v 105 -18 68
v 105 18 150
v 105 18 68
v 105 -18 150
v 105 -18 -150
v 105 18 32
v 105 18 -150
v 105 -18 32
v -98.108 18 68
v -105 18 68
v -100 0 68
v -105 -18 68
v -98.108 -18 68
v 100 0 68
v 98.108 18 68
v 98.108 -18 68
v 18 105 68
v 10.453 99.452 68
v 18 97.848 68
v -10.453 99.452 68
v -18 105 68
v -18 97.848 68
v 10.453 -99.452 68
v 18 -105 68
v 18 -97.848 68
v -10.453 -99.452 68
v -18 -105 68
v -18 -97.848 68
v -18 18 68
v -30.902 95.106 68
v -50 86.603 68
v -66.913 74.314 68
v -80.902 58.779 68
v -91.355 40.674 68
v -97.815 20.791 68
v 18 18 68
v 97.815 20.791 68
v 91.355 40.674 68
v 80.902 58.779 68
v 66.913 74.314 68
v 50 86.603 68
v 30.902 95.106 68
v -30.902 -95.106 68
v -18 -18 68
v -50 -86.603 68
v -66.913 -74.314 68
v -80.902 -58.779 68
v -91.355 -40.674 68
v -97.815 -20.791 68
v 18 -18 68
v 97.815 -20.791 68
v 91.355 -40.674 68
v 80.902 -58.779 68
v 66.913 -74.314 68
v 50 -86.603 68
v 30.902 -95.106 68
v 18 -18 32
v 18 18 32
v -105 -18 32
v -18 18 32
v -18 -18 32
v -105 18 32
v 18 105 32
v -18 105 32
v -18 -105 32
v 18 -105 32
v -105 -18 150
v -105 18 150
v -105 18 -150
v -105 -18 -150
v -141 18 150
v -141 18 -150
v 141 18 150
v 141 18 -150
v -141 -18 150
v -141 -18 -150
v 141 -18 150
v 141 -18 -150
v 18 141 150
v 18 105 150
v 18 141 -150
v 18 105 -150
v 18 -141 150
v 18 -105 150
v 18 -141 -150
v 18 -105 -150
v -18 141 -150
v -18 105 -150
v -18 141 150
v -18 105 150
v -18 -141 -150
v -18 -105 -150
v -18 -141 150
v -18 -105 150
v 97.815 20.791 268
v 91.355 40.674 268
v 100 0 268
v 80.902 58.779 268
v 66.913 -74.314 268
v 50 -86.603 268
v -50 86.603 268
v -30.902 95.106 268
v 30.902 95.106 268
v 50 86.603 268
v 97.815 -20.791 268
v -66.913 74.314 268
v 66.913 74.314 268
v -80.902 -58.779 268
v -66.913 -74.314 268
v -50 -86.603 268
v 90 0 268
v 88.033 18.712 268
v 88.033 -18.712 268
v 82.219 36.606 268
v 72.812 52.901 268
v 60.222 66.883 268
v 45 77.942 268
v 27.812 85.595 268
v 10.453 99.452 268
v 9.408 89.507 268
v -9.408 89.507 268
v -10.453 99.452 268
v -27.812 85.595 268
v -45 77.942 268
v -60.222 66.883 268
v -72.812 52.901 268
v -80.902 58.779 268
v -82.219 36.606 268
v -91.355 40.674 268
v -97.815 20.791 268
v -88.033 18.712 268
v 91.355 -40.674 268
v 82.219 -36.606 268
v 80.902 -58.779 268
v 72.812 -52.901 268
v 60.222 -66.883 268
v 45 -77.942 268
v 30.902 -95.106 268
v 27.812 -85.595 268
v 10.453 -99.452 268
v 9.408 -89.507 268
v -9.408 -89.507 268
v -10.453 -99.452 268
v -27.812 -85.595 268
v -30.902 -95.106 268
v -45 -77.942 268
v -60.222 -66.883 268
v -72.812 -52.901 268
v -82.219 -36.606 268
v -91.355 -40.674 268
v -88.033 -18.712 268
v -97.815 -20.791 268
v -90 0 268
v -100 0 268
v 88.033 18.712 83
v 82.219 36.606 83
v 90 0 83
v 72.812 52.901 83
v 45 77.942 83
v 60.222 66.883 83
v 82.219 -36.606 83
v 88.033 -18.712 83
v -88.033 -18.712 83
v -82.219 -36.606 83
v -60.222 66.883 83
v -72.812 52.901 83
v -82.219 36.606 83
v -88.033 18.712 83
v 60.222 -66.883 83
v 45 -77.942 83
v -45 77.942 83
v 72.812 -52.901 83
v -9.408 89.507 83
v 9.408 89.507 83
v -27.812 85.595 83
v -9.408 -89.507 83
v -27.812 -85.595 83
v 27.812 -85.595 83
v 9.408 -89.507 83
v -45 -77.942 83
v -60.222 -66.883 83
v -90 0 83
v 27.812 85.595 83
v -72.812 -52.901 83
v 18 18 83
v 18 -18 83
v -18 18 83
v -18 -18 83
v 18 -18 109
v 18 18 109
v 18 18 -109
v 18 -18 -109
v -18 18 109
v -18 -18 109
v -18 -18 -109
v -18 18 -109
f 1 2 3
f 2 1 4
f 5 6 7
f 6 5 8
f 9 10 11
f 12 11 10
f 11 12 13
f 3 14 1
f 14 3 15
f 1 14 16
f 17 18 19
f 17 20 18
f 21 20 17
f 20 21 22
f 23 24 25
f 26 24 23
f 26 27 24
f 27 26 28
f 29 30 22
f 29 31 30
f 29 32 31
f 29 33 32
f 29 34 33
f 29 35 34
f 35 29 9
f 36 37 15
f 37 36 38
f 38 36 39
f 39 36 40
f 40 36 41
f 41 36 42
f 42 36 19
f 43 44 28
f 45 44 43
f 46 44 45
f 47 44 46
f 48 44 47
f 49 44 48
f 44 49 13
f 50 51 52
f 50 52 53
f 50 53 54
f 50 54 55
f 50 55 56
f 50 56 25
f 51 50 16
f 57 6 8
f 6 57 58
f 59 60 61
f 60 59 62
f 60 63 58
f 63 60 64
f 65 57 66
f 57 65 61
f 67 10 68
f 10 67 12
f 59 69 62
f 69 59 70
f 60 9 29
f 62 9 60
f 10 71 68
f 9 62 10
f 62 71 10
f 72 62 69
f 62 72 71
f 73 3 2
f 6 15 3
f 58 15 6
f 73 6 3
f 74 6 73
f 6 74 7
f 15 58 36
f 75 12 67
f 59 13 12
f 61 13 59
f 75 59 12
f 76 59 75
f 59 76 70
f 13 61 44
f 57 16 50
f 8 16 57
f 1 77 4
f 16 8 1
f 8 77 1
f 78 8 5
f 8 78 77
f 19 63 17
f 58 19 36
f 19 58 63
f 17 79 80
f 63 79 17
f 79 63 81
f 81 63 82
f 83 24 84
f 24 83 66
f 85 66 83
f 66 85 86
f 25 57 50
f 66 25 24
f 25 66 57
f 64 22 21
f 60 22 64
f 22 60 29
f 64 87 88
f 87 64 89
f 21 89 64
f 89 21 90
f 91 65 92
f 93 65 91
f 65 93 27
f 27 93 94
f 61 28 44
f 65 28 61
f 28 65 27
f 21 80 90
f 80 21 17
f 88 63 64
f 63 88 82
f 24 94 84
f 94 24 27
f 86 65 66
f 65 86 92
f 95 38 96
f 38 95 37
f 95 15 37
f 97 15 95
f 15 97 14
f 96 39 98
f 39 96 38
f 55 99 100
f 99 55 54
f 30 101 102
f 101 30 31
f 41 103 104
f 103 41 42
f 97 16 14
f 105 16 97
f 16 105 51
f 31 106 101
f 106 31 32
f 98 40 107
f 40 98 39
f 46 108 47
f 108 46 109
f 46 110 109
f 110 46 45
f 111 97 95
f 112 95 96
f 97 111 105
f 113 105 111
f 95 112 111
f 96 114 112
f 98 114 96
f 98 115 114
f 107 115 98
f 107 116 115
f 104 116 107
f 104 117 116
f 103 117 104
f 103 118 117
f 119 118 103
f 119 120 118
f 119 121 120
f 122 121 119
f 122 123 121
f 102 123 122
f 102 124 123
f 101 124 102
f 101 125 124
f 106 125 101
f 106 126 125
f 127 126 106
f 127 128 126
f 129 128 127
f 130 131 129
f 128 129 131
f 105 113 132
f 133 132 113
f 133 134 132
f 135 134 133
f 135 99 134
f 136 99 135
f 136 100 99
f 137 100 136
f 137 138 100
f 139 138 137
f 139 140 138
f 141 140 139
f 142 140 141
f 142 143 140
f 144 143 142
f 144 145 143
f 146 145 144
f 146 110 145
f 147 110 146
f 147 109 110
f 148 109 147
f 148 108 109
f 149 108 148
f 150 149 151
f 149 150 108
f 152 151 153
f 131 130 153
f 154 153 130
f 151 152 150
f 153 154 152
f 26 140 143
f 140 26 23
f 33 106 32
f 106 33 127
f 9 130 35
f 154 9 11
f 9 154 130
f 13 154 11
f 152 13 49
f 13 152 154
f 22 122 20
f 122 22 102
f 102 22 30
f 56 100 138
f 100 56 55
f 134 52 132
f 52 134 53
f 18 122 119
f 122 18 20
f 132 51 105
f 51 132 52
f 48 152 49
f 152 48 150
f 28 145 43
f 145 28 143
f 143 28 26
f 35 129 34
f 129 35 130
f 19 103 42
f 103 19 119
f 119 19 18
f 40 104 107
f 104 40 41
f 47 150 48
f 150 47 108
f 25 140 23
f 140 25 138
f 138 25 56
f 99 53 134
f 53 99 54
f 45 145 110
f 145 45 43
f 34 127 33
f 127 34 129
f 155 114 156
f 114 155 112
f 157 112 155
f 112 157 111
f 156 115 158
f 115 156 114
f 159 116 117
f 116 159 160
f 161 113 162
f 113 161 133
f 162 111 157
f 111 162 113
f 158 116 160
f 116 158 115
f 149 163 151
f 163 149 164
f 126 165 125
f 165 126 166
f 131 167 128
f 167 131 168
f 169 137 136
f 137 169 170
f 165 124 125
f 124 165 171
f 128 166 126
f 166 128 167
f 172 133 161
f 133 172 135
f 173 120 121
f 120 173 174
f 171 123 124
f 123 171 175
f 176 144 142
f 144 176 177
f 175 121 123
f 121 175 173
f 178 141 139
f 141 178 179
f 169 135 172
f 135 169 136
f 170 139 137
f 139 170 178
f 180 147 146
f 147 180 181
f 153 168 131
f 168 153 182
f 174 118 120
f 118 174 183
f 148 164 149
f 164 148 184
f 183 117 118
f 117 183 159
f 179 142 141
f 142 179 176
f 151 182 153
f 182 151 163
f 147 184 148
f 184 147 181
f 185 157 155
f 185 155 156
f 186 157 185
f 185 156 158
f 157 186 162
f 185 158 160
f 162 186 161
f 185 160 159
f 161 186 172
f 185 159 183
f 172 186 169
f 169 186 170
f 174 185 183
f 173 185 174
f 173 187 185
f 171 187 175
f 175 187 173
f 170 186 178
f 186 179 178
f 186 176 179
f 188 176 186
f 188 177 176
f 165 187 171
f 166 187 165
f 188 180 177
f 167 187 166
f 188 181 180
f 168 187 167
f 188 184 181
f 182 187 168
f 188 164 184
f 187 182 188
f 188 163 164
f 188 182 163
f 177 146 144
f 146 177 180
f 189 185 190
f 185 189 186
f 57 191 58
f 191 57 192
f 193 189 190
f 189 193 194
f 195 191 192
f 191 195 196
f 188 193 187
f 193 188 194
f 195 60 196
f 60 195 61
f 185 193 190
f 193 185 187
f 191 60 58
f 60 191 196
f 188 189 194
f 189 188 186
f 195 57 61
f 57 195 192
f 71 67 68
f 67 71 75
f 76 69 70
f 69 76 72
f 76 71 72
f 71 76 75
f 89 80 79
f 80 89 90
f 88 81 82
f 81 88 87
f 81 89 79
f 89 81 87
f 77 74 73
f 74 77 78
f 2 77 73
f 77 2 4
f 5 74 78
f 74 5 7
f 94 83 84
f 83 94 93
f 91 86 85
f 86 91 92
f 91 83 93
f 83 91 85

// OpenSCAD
//material stats : t=36,w=385,l=1430

mat_w = 300;
mat_t = 36; //material thickness

tower_h = 300;
support_h=50;
tower_internal_width = 210;

echo("tower_h =", tower_h);
echo("internal width = ", tower_internal_width);
h_center_support = tower_h/2+support_h+mat_t/2;
echo("h center supports = ", h_center_support); 


cube(size = [mat_t, mat_t, h_center_support], center = true);

module green_vase() {
    color("OliveDrab"){
    translate([0,0, 200/2]){
        difference(){
            cylinder(h=200, r=100, center=true);
            translate([0,0,10]){
                cylinder(h=190, r=90, center=true);
            }
        }
    }
    }
}

module grey_palm_vase() {
    //d=26
    //d_bot = 21
    //h=25
    //flat = 7
    
    h_horizontal_area = 70;
    h_angled_area = 180;
    r_bottom = 105;
    r_top = 155;
    
    module v(r_bottom) {
        translate([0,0,h_angled_area/2+h_horizontal_area/2]){
            cylinder(h=h_horizontal_area, r=r_bottom+50, center=true);
        }
        cylinder(h=h_angled_area, r1=r_bottom, r2=r_bottom+50, center=true);
    }
    
    translate([0,0,180/2]){
        color("DarkGray"){
            difference(){
              v(105);
              translate([0,0,5]){
                v(90);
              }
            }
        }
    }
}

module leg(x_disp, y_disp) {
    translate([x_disp, y_disp, 0]){
        cube(size = [mat_t, mat_t, tower_h], center = true);
    }
}


//legs
leg(-(tower_internal_width/2+mat_t/2), 0);
leg(0, (tower_internal_width/2+mat_t/2));
leg((tower_internal_width/2+mat_t/2), 0);
leg(0, -(tower_internal_width/2+mat_t/2));

//supports
translate([0,0,support_h]){
    cube(size = [tower_internal_width, mat_t, mat_t], center = true);
    cube(size = [mat_t, tower_internal_width, mat_t], center = true);
}

translate([0,0,support_h+mat_t/2]){
//grey_palm_vase();
green_vase();
}
